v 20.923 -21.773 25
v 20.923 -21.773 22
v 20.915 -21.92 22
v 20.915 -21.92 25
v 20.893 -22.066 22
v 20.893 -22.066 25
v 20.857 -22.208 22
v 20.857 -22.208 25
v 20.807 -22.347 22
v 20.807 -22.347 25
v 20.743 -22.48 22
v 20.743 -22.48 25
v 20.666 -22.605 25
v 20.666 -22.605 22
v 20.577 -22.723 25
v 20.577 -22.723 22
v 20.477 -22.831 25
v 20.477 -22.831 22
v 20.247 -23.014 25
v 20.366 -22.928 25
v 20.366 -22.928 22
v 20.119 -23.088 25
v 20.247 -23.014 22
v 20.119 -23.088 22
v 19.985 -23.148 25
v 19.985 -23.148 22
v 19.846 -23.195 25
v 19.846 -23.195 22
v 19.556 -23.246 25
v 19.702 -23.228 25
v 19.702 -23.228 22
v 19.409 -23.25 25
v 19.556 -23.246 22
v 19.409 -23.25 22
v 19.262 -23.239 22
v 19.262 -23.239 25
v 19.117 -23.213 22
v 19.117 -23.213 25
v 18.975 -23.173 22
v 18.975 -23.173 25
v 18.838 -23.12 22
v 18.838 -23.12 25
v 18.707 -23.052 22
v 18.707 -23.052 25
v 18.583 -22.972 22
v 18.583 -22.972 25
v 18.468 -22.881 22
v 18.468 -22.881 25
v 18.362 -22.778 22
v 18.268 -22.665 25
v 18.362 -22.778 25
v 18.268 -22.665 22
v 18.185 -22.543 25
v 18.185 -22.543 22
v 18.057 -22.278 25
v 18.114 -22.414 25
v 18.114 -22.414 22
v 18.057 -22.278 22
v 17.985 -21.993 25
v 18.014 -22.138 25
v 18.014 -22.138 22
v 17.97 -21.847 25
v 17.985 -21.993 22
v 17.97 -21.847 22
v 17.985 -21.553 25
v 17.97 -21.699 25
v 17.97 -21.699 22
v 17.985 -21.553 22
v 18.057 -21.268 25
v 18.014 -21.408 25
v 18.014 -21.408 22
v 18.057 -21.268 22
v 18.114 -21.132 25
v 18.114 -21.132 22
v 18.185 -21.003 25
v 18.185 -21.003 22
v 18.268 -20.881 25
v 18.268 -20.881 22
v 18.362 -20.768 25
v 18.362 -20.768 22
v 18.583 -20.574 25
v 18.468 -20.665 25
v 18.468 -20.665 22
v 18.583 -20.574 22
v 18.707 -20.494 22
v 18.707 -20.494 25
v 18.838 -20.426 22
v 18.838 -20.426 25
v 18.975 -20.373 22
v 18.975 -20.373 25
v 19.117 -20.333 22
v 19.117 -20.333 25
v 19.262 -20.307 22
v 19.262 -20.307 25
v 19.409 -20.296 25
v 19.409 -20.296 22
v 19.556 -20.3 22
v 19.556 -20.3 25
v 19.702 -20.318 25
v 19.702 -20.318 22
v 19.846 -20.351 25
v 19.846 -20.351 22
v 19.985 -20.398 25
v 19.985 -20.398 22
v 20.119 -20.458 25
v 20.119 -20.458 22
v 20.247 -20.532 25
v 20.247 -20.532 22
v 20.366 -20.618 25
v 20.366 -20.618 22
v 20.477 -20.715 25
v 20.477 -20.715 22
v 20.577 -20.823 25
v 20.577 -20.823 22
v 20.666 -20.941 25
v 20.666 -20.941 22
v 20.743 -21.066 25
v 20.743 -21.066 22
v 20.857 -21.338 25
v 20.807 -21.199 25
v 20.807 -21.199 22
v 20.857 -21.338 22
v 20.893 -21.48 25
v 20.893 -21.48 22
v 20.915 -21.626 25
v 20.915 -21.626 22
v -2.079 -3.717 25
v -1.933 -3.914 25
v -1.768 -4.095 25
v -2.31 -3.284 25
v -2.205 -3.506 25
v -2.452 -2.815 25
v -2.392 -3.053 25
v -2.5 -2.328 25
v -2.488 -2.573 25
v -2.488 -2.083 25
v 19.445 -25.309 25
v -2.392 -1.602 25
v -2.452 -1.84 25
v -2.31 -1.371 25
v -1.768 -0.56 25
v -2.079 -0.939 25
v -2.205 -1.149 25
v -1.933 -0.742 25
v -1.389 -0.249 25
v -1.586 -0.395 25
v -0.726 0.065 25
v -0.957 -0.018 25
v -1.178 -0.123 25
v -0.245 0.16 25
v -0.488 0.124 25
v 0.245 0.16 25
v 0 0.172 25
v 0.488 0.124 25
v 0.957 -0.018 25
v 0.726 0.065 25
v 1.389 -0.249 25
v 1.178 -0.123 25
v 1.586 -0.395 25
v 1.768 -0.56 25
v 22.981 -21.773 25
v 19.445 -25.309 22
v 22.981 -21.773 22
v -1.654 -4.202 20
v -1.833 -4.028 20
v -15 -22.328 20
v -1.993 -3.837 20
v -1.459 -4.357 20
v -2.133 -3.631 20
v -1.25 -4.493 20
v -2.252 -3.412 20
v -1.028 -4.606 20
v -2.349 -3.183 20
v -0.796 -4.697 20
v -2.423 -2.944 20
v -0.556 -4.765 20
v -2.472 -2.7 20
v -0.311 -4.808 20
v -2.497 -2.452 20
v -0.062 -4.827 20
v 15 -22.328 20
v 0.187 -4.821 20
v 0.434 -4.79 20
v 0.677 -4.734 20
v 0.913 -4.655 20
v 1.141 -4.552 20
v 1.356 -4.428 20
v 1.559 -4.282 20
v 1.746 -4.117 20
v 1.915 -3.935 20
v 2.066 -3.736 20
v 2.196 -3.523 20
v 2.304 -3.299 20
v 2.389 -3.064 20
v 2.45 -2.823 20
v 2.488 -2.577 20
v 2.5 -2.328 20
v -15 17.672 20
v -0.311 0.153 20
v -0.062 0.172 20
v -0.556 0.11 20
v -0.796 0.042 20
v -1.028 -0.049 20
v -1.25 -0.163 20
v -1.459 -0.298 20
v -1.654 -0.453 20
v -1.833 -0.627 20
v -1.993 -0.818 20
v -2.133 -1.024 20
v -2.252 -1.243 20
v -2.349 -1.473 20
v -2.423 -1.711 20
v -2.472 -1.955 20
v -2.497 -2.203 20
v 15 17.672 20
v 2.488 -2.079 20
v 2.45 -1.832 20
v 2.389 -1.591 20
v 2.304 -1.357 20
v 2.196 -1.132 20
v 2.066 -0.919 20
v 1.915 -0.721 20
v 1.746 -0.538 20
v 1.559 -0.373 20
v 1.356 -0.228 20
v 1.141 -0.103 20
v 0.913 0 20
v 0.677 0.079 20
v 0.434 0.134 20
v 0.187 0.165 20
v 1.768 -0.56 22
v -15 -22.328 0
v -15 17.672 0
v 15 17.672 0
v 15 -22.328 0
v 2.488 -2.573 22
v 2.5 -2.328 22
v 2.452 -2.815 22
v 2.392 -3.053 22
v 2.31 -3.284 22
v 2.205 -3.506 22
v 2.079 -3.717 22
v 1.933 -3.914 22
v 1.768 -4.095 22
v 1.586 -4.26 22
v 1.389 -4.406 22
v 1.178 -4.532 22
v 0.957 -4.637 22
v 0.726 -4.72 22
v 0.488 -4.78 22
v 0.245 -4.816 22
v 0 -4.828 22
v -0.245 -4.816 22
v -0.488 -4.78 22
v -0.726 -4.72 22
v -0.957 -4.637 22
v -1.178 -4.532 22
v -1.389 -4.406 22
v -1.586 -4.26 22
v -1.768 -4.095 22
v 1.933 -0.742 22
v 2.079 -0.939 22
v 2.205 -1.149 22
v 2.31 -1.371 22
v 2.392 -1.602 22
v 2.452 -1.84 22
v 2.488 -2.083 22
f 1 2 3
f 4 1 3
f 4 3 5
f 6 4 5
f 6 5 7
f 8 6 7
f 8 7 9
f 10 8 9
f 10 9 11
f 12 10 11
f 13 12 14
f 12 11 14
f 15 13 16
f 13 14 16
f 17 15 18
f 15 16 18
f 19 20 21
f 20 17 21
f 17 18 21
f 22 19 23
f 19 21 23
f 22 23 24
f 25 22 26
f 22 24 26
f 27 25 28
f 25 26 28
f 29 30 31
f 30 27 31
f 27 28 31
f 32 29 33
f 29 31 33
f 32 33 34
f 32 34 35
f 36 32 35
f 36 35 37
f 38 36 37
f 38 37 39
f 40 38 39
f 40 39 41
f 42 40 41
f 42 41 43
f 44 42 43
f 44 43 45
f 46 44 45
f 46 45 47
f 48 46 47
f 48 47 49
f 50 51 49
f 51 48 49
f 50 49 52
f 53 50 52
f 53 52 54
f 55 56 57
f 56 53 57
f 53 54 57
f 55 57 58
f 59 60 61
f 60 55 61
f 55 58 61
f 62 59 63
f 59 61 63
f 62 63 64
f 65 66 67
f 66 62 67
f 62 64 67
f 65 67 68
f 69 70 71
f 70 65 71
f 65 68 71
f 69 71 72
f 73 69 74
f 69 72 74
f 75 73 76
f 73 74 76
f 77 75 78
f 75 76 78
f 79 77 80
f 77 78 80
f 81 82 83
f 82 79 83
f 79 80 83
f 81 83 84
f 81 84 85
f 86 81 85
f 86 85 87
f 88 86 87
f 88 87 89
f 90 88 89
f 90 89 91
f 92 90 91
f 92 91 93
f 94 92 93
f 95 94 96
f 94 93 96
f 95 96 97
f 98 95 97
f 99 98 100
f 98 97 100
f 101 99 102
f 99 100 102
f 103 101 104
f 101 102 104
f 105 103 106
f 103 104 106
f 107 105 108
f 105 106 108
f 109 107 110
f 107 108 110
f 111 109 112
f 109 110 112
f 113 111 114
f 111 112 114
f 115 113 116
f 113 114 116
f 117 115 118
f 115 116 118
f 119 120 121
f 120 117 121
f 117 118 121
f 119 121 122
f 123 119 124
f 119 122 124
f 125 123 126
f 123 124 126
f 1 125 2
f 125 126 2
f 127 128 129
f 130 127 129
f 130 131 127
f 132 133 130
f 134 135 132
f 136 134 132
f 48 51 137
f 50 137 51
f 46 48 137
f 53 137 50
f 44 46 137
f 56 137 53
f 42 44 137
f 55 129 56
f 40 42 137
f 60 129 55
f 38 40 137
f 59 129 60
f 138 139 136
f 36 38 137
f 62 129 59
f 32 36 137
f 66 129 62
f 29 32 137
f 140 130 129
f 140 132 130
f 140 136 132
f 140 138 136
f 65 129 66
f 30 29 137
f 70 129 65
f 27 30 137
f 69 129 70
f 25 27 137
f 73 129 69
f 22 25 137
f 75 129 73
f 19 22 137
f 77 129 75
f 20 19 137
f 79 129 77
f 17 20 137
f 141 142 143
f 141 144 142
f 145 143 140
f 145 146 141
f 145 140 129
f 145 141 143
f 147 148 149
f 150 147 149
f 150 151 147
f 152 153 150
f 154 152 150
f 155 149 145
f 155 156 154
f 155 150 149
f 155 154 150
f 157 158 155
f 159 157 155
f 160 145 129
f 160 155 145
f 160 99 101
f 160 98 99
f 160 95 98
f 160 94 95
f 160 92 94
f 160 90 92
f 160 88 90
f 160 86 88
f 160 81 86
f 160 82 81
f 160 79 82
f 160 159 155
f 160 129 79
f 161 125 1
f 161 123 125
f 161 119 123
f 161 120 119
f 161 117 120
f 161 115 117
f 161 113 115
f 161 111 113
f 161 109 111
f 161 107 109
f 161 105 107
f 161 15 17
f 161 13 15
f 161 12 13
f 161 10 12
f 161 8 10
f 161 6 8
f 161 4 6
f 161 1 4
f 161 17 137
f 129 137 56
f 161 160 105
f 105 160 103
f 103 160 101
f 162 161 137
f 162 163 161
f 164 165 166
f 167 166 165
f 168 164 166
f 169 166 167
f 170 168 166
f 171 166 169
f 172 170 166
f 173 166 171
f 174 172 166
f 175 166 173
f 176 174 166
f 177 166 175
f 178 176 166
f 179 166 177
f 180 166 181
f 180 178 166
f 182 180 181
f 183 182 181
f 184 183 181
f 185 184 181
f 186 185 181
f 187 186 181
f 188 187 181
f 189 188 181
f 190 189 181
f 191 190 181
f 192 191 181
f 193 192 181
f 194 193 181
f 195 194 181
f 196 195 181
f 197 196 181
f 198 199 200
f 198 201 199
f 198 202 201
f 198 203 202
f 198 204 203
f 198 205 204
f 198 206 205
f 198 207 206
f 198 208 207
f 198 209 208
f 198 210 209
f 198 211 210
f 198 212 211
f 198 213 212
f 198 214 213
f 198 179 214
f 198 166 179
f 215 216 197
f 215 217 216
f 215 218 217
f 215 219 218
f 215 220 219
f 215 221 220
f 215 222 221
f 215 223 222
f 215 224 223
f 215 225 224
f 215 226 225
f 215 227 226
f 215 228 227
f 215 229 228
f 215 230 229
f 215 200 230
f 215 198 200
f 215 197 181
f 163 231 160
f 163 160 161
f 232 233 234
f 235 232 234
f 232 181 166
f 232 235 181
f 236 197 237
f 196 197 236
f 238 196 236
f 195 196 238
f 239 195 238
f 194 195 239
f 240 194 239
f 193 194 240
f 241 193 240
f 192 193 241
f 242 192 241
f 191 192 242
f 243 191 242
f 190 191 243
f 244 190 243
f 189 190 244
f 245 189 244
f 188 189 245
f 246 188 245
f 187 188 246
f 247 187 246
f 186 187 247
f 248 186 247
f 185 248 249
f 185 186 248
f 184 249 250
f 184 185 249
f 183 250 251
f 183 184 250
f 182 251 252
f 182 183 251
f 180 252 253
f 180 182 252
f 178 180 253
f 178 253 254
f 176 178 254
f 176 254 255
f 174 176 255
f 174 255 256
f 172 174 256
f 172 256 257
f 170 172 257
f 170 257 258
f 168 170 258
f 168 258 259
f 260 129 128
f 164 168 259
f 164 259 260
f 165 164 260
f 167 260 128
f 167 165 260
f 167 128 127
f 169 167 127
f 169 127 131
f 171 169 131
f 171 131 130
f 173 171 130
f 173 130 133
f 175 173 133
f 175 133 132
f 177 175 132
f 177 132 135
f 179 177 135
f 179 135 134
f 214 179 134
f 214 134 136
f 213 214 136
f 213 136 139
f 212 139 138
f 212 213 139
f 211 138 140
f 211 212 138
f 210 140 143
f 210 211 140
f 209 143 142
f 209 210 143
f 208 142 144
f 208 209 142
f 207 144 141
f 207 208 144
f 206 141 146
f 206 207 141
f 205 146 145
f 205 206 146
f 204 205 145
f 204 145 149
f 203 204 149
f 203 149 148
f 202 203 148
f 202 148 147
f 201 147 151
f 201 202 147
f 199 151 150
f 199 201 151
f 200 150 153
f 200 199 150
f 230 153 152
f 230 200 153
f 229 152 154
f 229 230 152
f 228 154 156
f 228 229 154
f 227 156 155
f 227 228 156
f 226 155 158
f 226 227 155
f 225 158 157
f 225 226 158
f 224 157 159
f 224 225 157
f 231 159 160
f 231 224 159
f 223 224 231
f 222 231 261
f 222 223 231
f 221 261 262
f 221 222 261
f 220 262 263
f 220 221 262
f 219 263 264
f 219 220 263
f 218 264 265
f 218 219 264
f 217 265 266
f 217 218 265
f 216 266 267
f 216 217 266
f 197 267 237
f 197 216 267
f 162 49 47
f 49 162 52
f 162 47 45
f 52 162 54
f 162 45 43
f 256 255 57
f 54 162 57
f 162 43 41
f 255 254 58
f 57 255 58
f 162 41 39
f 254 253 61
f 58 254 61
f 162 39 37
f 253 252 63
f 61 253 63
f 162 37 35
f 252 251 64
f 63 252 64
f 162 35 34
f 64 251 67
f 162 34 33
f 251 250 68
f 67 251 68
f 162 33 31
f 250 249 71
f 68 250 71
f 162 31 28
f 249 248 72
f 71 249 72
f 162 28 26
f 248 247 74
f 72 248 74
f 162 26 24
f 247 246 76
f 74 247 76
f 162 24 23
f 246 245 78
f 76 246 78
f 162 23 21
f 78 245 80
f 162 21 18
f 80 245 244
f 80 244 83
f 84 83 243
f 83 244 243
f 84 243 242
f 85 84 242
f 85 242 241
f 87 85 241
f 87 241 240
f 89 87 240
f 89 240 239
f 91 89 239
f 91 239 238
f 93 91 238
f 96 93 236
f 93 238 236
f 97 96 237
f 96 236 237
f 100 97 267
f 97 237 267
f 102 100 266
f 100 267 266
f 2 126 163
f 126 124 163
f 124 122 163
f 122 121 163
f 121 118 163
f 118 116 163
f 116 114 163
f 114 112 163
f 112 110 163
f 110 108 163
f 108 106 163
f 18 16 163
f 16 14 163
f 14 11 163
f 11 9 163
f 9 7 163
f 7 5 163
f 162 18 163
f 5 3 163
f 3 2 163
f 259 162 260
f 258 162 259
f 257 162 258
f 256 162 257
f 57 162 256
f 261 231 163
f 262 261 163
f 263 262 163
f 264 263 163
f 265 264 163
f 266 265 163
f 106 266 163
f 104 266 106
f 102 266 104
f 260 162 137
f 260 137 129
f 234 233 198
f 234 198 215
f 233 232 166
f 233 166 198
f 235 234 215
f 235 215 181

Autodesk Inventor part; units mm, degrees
ref_plane "YZ Plane" through (0, 0, 0) normal (1, 0, 0) x (0, 1, 0)
ref_plane "XZ Plane" through (0, 0, 0) normal (0, 1, 0) x (-1, 0, 0)
ref_plane "XY Plane" through (0, 0, 0) normal (0, 0, 1) x (1, 0, 0)
sketch "Skizze1" plane through (0, 0, 0) normal (0, 0, 1) x (1, 0, 0)
  line L0 (-21, 0) -> (21, 0) projected
  line L1 (0, -30.3276) -> (0, 25.6724) projected
  line L2 (-15, 17.6724) -> (15, 17.6724)
  line L3 (15, 17.6724) -> (15, -22.3276)
  line L4 (15, -22.3276) -> (-15, -22.3276)
  line L5 (-15, -22.3276) -> (-15, 17.6724)
  point P0 (0, 0)
  dimension "d0" = 40
  dimension "d1" = 30
extrude "Extrusion1" add sketch "Skizze1" along normal blind 20
sketch "Skizze5" plane through (0, 0, 20) normal (0, 0, 1) x (1, 0, 0)
  circle A0 centre (0, -2.3276) radius 2.5
  line L0 (15, 17.6724) -> (-15, 17.6724) projected
  point P0 (0, 0)
  dimension "d22" = 5
  dimension "d23" = 20
extrude "Extrusion5" add sketch "Skizze5" along normal blind 2
sketch "Skizze6" plane through (0, -2.3276, 22) normal (0, 0, 1) x (1, 0, 0)
  circle A0 centre (0, 0) radius 2.5 projected
  line L0 (-2.5, 0) -> (2.5, 0)
  line L1 (1.7678, 1.7678) -> (0, 0)
  line L2 (0, 0) -> (-1.7678, -1.7678)
  line L3 (1.7678, 1.7678) -> (22.981, -19.4454)
  line L4 (22.981, -19.4454) -> (19.4454, -22.981)
  line L5 (19.4454, -22.981) -> (-1.7678, -1.7678)
  circle A1 centre (19.4454, -19.4454) radius 1.4773
  point P0 (0, 2.3276)
  dimension "d26" = 45
  dimension "d27" = 30
  dimension "d28" = 2.5
  dimension "d29" = 2.5
extrude "Extrusion6" add sketch "Skizze6" along normal blind 3
properties part number "Motor"
